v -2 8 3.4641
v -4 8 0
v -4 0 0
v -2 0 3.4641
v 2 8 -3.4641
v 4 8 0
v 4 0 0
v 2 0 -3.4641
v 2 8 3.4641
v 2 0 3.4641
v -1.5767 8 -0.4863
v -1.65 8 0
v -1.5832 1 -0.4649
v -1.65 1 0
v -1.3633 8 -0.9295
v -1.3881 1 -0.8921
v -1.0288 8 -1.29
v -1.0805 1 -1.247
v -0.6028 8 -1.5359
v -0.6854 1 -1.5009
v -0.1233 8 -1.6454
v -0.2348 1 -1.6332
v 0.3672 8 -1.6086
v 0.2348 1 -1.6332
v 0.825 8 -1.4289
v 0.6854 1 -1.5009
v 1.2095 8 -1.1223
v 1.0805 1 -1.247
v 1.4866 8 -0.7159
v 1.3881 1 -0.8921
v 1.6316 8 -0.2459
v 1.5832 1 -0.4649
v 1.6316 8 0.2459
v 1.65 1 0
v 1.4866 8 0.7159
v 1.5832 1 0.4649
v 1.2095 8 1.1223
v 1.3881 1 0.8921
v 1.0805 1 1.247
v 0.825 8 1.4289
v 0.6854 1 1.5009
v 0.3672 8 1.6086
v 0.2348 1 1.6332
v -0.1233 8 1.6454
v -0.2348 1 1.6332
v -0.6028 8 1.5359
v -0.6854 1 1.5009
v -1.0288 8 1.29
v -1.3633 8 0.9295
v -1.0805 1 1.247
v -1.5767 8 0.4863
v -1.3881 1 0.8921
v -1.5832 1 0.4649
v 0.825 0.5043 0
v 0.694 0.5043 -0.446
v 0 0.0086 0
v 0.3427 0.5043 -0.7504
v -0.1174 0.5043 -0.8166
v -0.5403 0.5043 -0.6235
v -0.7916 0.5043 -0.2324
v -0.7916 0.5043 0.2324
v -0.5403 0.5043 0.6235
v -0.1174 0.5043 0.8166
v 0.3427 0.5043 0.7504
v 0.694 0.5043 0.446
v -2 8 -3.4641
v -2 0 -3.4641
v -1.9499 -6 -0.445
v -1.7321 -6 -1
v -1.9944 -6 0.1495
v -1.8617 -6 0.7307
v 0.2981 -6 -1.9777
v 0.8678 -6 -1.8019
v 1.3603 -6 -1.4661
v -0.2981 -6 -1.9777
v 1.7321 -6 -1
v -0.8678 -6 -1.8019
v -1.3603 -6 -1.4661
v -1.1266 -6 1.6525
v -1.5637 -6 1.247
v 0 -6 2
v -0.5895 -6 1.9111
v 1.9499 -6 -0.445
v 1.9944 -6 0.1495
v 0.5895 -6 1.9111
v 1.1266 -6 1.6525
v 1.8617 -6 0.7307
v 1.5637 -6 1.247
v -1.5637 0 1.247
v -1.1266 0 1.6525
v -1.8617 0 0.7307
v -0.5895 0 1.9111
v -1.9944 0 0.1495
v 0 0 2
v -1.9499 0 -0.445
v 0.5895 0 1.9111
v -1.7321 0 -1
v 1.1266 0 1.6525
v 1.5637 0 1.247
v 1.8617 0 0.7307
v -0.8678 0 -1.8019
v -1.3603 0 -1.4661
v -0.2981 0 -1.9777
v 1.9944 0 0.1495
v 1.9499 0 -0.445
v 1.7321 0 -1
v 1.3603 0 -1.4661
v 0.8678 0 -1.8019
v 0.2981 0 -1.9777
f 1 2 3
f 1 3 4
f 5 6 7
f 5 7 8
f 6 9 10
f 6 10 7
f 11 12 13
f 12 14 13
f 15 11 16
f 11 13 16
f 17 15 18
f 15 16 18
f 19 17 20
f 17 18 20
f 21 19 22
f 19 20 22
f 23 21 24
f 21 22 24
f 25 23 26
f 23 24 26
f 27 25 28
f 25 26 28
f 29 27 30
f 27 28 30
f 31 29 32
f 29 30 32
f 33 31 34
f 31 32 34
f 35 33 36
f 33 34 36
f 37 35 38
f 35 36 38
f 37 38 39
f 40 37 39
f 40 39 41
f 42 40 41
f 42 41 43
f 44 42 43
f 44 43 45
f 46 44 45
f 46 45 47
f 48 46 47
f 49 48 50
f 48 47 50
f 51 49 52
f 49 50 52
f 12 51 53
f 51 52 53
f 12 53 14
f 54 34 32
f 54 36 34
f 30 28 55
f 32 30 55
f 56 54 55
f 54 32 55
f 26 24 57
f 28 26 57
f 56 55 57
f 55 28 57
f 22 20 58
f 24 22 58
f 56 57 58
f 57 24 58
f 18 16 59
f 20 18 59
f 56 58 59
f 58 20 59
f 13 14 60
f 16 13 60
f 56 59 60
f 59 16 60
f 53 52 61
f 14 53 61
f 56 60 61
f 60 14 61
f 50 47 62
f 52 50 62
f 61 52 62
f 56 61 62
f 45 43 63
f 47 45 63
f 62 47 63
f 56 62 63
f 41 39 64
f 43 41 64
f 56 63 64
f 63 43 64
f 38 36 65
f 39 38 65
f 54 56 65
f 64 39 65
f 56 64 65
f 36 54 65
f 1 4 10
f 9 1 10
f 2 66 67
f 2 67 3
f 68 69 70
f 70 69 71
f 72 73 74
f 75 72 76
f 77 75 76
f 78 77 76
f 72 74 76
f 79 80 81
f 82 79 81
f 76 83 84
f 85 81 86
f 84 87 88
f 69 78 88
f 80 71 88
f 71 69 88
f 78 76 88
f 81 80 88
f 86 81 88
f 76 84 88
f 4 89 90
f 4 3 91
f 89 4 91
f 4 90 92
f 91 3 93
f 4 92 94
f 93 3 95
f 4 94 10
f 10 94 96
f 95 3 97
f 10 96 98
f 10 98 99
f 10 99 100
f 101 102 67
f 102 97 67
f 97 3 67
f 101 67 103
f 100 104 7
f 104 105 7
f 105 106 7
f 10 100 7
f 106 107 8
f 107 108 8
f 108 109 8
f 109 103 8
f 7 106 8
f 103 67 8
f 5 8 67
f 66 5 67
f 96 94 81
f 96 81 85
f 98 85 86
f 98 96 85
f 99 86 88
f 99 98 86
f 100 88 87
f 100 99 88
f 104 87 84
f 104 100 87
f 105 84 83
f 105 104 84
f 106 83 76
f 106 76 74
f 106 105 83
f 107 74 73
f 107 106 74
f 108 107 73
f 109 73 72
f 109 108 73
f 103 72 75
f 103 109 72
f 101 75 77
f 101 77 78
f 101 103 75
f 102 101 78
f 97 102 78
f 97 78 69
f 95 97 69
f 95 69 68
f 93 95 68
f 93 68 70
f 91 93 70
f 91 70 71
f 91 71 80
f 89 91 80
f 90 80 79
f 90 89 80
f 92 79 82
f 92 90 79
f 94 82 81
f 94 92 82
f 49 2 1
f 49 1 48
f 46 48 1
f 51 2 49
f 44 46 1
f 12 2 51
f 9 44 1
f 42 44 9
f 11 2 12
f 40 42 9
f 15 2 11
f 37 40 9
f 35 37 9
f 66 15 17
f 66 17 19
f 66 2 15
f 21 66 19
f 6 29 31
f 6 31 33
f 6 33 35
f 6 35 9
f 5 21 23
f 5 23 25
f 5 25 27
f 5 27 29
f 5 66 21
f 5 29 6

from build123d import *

# Parameters (mm, degrees)
SKETCH1_R                       = 2
BOSS_EXTRUDE1_DEPTH             = 6
BOSS_EXTRUDE2_DEPTH             = 8
TAP_DRILL_FOR_M4X0_7_TAP1_D     = 3.3
TAP_DRILL_FOR_M4X0_7_TAP1_DEPTH = 7
TAP_DRILL_FOR_M4X0_7_TAP1_TIP   = 0.991420021


with BuildPart() as part:
    # Sketch1 → Boss-Extrude1 (new body)
    with BuildSketch(Plane(origin=(0, 0, 0), x_dir=(1, 0, 0), z_dir=(0, 1, 0))):
        with Locations(Location((0, 0, 0), (0, 0, 270))):
            Circle(SKETCH1_R)
    extrude(amount=-BOSS_EXTRUDE1_DEPTH)

    # Sketch2 → Boss-Extrude2 (add)
    with BuildSketch(Plane(origin=(0, 0, 0), x_dir=(1, 0, 0), z_dir=(0, 1, 0))):
        Polygon((4, 0), (2, 3.464101615), (-2, 3.464101615), (-4, 0), (-2, -3.464101615), (2, -3.464101615), align=None)
    extrude(amount=BOSS_EXTRUDE2_DEPTH)

    # Tap Drill for M4x0.7 Tap1
    with Locations(Plane(origin=(0, 8, 0), x_dir=(1, 0, 0), z_dir=(0, 1, 0))):
        with Locations((0, 0)):
            Hole(TAP_DRILL_FOR_M4X0_7_TAP1_D / 2, depth=TAP_DRILL_FOR_M4X0_7_TAP1_DEPTH)
            with Locations((0, 0, -(TAP_DRILL_FOR_M4X0_7_TAP1_DEPTH + TAP_DRILL_FOR_M4X0_7_TAP1_TIP / 2))):  # 118° drill point
                Cone(0, TAP_DRILL_FOR_M4X0_7_TAP1_D / 2, TAP_DRILL_FOR_M4X0_7_TAP1_TIP, mode=Mode.SUBTRACT)


solid = part.part
